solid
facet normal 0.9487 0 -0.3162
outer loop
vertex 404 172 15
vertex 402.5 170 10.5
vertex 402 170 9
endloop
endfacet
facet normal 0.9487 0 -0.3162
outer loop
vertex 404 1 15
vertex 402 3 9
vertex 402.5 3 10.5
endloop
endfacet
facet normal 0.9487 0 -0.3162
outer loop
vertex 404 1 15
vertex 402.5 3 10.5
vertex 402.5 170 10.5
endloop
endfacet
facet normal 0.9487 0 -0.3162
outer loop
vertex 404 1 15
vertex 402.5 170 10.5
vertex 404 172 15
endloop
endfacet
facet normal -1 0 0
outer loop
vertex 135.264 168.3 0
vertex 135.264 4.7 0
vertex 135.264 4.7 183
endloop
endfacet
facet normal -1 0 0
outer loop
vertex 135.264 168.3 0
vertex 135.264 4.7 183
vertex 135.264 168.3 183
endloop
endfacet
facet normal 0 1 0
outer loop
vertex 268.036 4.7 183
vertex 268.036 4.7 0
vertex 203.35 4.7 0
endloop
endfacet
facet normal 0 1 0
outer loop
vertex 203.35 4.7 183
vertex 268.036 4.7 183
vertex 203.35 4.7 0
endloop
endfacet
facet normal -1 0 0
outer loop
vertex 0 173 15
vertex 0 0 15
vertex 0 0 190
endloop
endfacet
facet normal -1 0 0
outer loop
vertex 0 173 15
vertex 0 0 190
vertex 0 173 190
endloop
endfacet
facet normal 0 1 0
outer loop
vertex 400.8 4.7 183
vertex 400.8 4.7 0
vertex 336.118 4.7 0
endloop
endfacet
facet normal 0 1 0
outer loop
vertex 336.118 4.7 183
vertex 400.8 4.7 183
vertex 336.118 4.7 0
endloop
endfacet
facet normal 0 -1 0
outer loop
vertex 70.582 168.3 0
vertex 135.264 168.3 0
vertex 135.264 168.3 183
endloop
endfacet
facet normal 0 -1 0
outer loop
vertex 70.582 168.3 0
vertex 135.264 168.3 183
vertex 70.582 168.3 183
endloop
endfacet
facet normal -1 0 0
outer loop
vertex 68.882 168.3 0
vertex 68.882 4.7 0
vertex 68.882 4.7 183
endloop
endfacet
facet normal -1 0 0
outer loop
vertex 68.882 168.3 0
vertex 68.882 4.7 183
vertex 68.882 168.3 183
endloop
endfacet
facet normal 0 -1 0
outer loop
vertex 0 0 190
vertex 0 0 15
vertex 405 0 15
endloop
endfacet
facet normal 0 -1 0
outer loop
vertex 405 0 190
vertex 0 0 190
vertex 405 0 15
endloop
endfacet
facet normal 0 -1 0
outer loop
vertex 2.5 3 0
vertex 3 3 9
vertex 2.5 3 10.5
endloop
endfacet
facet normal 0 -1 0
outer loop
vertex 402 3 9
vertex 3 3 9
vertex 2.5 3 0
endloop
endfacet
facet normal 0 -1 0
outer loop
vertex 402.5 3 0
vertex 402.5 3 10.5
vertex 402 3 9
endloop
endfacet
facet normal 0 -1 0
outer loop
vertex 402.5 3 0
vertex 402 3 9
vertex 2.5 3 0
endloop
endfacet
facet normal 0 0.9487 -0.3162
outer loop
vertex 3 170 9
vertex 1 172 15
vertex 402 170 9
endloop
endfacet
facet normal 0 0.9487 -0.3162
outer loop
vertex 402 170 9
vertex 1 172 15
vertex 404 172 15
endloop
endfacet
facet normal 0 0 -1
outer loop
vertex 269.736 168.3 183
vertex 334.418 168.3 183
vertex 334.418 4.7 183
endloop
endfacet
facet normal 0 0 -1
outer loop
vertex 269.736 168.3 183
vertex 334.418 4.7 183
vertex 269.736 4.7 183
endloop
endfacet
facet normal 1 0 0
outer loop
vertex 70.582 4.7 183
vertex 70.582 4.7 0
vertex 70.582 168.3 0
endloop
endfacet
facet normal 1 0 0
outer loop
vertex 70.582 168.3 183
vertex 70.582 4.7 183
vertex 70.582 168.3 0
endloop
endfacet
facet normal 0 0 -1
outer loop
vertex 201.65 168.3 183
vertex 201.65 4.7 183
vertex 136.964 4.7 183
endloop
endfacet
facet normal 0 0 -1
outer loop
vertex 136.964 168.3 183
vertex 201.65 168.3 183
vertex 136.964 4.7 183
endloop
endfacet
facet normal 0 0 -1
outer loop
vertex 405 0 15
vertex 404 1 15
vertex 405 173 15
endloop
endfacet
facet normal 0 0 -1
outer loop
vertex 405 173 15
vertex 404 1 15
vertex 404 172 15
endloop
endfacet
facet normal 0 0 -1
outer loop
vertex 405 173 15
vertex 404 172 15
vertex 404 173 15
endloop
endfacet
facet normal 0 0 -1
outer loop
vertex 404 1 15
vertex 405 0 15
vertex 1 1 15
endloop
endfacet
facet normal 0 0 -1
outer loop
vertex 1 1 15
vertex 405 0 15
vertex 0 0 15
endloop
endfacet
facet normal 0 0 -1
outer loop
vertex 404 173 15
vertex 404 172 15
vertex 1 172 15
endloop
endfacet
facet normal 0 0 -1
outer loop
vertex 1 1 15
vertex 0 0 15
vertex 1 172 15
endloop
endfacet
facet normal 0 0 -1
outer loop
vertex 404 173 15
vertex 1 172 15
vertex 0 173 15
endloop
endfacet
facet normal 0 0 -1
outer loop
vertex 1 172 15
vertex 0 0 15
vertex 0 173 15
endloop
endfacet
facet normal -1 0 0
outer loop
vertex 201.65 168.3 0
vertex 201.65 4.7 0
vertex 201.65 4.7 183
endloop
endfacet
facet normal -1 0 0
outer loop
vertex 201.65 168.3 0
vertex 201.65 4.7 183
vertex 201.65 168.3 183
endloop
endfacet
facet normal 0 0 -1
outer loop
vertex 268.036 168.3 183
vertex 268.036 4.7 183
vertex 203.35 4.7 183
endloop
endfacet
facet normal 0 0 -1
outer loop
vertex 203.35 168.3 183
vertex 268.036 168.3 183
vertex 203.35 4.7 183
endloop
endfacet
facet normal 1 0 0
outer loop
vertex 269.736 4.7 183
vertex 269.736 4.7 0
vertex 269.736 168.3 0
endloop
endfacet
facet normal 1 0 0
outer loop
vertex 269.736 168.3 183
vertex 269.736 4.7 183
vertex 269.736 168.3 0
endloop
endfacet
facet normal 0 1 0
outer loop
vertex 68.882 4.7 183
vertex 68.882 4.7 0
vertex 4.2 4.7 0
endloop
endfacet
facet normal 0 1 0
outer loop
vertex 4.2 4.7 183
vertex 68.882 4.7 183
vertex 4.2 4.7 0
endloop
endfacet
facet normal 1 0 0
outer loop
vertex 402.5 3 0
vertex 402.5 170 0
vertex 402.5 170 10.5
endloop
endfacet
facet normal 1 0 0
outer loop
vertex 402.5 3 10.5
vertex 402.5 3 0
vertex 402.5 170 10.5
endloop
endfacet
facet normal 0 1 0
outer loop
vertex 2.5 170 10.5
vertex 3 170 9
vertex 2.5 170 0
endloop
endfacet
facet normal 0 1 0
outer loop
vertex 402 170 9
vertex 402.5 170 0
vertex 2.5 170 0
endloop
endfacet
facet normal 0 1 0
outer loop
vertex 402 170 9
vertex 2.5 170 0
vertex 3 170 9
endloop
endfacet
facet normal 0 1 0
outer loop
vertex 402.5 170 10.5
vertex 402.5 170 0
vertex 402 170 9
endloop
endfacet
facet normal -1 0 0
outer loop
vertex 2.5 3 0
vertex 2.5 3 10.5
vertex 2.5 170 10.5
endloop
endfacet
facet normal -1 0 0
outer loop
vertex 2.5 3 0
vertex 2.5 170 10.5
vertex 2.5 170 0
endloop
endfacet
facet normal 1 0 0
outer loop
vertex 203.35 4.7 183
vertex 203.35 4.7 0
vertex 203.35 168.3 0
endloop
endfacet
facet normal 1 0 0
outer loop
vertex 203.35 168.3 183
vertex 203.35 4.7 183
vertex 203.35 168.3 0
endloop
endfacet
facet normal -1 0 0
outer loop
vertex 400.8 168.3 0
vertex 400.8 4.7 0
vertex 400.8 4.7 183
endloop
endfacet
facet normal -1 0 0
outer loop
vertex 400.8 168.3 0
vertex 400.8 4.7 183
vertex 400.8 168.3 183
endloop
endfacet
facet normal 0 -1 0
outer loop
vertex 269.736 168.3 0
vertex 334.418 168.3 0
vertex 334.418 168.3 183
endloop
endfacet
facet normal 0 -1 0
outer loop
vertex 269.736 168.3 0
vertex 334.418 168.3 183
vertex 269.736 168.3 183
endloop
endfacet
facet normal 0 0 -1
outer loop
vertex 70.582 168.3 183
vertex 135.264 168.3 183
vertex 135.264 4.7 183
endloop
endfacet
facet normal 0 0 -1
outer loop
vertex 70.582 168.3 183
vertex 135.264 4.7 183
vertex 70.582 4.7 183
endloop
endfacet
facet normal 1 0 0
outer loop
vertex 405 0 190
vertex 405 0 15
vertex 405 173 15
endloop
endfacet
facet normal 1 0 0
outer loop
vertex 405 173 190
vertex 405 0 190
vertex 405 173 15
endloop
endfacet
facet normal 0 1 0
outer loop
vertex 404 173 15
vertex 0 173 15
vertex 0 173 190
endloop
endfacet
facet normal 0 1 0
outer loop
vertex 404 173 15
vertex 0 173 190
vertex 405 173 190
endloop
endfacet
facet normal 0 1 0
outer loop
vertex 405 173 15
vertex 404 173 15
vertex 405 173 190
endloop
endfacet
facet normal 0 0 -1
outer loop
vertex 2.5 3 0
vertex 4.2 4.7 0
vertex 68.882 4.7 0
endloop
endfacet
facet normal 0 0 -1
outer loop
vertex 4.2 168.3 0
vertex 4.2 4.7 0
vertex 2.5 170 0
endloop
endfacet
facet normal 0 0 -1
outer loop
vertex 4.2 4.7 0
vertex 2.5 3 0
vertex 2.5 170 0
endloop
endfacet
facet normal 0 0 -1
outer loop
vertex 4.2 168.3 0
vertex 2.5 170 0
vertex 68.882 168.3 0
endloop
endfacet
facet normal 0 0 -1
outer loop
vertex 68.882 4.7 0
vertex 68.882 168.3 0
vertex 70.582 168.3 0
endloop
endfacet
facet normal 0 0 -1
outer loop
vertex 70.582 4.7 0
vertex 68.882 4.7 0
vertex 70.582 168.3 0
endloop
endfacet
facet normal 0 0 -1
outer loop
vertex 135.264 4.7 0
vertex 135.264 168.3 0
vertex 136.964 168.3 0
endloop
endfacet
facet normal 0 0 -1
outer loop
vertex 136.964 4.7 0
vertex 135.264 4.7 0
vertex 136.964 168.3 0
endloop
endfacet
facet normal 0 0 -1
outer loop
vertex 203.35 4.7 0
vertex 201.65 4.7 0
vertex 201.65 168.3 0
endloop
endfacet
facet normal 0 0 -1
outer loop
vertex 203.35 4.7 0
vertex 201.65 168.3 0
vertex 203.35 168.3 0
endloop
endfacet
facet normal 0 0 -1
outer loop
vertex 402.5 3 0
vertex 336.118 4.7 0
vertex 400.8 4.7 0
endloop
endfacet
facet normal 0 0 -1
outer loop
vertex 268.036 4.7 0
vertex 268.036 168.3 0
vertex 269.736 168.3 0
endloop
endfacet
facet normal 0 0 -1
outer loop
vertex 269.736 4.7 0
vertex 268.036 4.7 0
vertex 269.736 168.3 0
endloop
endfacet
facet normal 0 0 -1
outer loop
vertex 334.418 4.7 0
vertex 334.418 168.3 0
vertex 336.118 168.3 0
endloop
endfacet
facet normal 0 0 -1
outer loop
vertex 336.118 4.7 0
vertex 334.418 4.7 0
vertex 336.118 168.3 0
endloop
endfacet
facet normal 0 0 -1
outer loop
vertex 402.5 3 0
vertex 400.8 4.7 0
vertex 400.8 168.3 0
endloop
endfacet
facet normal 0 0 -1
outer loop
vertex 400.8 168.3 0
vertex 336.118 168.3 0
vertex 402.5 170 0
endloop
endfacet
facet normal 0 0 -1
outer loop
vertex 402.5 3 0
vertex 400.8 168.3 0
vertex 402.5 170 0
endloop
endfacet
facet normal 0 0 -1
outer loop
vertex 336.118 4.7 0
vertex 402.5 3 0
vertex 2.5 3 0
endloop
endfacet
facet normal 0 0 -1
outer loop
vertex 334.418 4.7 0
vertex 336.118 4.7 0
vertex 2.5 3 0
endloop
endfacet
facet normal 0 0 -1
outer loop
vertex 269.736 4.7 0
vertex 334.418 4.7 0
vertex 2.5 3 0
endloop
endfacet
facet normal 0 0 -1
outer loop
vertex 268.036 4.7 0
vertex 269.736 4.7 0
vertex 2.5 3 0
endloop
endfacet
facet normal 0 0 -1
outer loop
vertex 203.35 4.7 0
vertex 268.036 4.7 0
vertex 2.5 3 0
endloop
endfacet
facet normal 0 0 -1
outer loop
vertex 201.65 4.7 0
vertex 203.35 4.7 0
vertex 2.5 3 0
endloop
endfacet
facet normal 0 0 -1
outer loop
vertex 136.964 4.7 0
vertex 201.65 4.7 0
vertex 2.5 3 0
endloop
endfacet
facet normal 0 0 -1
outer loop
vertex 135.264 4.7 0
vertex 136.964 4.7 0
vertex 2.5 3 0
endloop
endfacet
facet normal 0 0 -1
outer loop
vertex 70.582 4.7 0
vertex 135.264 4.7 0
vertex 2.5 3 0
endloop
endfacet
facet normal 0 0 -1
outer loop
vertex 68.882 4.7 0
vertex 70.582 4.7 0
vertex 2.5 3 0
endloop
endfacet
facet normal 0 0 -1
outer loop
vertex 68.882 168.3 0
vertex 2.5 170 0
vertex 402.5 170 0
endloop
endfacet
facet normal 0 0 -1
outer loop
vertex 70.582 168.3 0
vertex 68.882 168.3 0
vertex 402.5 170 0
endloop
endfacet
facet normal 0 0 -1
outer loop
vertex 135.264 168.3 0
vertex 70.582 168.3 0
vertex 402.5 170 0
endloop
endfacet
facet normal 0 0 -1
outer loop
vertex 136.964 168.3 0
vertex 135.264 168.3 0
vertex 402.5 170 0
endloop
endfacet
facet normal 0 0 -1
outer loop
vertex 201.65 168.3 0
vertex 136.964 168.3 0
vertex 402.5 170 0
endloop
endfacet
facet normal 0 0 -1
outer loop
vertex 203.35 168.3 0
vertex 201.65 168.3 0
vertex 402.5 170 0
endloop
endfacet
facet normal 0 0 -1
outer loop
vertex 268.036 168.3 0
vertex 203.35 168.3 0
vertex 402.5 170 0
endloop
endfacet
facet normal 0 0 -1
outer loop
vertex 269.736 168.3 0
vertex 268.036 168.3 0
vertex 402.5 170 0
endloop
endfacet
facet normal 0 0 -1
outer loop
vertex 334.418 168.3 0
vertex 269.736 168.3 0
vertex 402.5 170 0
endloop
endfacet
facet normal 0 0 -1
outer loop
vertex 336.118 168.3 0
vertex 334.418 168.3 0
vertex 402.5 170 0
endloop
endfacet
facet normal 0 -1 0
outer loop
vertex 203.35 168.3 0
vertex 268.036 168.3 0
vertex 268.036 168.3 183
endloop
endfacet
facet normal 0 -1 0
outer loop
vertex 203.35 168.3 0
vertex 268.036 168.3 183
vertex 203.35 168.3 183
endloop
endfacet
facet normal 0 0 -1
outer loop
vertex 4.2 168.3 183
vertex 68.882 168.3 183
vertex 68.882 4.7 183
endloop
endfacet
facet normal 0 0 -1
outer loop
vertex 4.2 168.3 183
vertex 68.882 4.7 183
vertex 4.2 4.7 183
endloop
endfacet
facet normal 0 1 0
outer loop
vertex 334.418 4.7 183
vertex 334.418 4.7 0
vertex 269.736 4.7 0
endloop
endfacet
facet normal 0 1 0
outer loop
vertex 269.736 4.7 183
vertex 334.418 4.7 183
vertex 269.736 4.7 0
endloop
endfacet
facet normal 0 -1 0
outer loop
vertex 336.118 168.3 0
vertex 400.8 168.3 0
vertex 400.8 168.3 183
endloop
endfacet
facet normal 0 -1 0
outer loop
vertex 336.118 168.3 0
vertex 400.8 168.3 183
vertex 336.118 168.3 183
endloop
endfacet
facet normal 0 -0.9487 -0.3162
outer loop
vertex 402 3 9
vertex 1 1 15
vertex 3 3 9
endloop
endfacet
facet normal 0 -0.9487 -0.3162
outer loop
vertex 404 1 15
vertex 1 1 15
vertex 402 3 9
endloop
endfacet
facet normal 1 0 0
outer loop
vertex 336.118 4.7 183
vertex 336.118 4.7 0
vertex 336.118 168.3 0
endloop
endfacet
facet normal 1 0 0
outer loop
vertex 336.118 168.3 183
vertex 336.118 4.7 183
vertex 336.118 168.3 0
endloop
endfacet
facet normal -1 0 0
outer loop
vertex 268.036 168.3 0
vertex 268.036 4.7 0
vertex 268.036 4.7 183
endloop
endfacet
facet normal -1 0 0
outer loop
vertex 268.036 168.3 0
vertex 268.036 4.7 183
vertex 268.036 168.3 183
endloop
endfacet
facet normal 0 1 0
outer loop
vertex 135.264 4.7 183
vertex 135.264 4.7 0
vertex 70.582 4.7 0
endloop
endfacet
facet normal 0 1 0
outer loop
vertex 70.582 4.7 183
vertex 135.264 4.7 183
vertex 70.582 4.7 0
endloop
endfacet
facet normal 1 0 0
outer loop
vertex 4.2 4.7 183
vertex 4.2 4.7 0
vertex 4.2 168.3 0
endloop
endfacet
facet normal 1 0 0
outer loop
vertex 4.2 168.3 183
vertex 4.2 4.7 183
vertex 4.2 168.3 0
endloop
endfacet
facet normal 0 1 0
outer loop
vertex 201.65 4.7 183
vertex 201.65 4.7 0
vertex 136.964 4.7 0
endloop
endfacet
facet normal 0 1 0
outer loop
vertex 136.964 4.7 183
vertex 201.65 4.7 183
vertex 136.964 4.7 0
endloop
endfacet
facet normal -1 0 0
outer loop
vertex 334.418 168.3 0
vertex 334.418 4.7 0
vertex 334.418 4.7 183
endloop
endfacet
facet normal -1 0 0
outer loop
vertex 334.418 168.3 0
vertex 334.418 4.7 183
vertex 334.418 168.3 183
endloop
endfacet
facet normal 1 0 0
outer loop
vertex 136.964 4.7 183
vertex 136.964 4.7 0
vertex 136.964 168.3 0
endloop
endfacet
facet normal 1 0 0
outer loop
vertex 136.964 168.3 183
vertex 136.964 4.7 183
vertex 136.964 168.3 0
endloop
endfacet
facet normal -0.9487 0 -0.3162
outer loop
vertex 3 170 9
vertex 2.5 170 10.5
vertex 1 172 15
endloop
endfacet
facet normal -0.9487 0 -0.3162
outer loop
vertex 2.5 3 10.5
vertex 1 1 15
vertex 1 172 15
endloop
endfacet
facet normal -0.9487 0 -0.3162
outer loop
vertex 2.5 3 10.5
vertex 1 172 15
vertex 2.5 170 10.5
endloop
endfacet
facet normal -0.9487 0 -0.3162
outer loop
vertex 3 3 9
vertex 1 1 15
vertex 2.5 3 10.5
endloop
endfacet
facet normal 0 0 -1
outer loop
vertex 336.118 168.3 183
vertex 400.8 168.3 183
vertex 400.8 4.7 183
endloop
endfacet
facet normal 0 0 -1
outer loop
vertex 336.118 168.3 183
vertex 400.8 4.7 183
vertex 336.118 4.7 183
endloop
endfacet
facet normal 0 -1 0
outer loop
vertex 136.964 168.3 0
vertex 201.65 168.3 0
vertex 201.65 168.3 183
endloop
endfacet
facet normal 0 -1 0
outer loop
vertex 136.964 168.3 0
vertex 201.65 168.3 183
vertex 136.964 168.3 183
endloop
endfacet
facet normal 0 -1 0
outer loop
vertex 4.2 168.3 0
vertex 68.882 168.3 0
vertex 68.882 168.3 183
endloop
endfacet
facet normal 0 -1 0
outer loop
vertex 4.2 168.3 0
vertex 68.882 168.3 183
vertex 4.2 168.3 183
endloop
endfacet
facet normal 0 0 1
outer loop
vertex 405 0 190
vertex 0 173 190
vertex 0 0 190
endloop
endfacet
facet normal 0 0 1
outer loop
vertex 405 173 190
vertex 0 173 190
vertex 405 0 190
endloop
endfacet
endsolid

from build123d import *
from OCP.BRepFilletAPI import BRepFilletAPI_MakeChamfer

# Parameters (mm, degrees)
SKETCH_1_W          = 405
SKETCH_1_H          = 173
EXTRUDE_1_DEPTH     = 190
SKETCH_2_W          = 405
SKETCH_2_H          = 173
SKETCH_2_W_2        = 400
SKETCH_2_H_2        = 167
CUT_EXTRUDE_1_DEPTH = 9
SKETCH_3_W          = 405
SKETCH_3_H          = 6
CUT_EXTRUDE_2_DEPTH = 1
SKETCH_4_W          = 6
SKETCH_4_H          = 173
CUT_EXTRUDE_3_DEPTH = 1
SKETCH_5_W          = 404
SKETCH_5_H          = 6
CUT_EXTRUDE_4_DEPTH = 1
SKETCH_6_W          = 6
SKETCH_6_H          = 171
CUT_EXTRUDE_5_DEPTH = 1
CHAMFER_1_SIZE      = 6
CHAMFER_1_SIZE_2    = 2
CHAMFER_2_SIZE      = 2
CHAMFER_2_SIZE_2    = 6
SKETCH_7_W          = 64.686
SKETCH_7_H          = 163.6
SKETCH_7_W_2        = 64.682
CUT_EXTRUDE_6_DEPTH = 183


# Some blends are built 0.0001 mm under size
with BuildPart() as part:
    # 草图1 → 凸台-拉伸1 (new body)
    with BuildSketch(Plane.XY):
        with Locations((202.5, 86.5)):
            Rectangle(SKETCH_1_W, SKETCH_1_H)
    extrude(amount=EXTRUDE_1_DEPTH)

    # 草图2 → 切除-拉伸1 (cut)
    with BuildSketch(Plane(origin=(0, 0, 0), x_dir=(-1, 0, 0), z_dir=(0, 0, -1))):
        with Locations((-202.5, 86.5)):
            Rectangle(SKETCH_2_W, SKETCH_2_H)
        with Locations((-202.5, 86.5)):
            Rectangle(SKETCH_2_W_2, SKETCH_2_H_2, mode=Mode.SUBTRACT)
    extrude(amount=-CUT_EXTRUDE_1_DEPTH, mode=Mode.SUBTRACT)

    # 草图3 → 切除-拉伸2 (cut)
    with BuildSketch(Plane.XZ):
        with Locations((202.5, 12)):
            Rectangle(SKETCH_3_W, SKETCH_3_H)
    extrude(amount=-CUT_EXTRUDE_2_DEPTH, mode=Mode.SUBTRACT)

    # 草图4 → 切除-拉伸3 (cut)
    with BuildSketch(Plane(origin=(405, 0, 0), x_dir=(0, 0, -1), z_dir=(1, 0, 0))):
        with Locations((-12, 86.5)):
            Rectangle(SKETCH_4_W, SKETCH_4_H)
    extrude(amount=-CUT_EXTRUDE_3_DEPTH, mode=Mode.SUBTRACT)

    # 草图5 → 切除-拉伸4 (cut)
    with BuildSketch(Plane(origin=(0, 173, 0), x_dir=(1, 0, 0), z_dir=(0, 1, 0))):
        with Locations((202, -12)):
            Rectangle(SKETCH_5_W, SKETCH_5_H)
    extrude(amount=-CUT_EXTRUDE_4_DEPTH, mode=Mode.SUBTRACT)

    # 草图6 → 切除-拉伸5 (cut)
    with BuildSketch(Plane.ZY):
        with Locations((12, 86.5)):
            Rectangle(SKETCH_6_W, SKETCH_6_H)
    extrude(amount=-CUT_EXTRUDE_5_DEPTH, mode=Mode.SUBTRACT)

    # 倒角1
    # the kernel refuses this chamfer: 6, 2 mm, written as the material it takes off along each edge
    with BuildSketch(Plane(origin=(1, -14.570366064, 9), x_dir=(-0.012185754582199162, 0, 0.9999257509361694), z_dir=(0, 1, 0))) as chamfer_1_piece_1_section:
        Polygon((CHAMFER_1_SIZE * 0.999925750936, CHAMFER_1_SIZE * 0.0121857545822), (-CHAMFER_1_SIZE_2 * 0.0121857545822, CHAMFER_1_SIZE_2 * 0.999925750936), (0, 0), align=None)
    chamfer_1_piece_1 = extrude(amount=202.140732128, mode=Mode.PRIVATE)
    chamfer_1_piece_1 = split(chamfer_1_piece_1, bisect_by=Plane(origin=(2.5, 2, 11.1), z_dir=(-1, 0, 0)), keep=Keep.TOP, mode=Mode.PRIVATE)
    add(chamfer_1_piece_1, mode=Mode.SUBTRACT)
    with BuildSketch(Plane(origin=(1, -14.570366064, 9), x_dir=(-0.012185754582199162, 0, 0.9999257509361694), z_dir=(0, 1, 0))) as chamfer_1_piece_2_section:
        Polygon((CHAMFER_1_SIZE * 0.999925750936, CHAMFER_1_SIZE * 0.0121857545822), (-CHAMFER_1_SIZE_2 * 0.0121857545822, CHAMFER_1_SIZE_2 * 0.999925750936), (0, 0), align=None)
    chamfer_1_piece_2 = extrude(amount=202.140732128, mode=Mode.PRIVATE)
    chamfer_1_piece_2 = split(chamfer_1_piece_2, bisect_by=Plane(origin=(2.666666667, 3, 9.5), z_dir=(0, -1, 0)), keep=Keep.TOP, mode=Mode.PRIVATE)
    add(chamfer_1_piece_2, mode=Mode.SUBTRACT)
    with BuildSketch(Plane(origin=(1, -14.570366064, 9), x_dir=(-0.012185754582199162, 0, 0.9999257509361694), z_dir=(0, 1, 0))) as chamfer_1_piece_3_section:
        Polygon((CHAMFER_1_SIZE * 0.999925750936, CHAMFER_1_SIZE * 0.0121857545822), (-CHAMFER_1_SIZE_2 * 0.0121857545822, CHAMFER_1_SIZE_2 * 0.999925750936), (0, 0), align=None)
    chamfer_1_piece_3 = extrude(amount=202.140732128, mode=Mode.PRIVATE)
    chamfer_1_piece_3 = split(chamfer_1_piece_3, bisect_by=Plane(origin=(2.666666667, 170, 9.5), z_dir=(0, 1, 0)), keep=Keep.TOP, mode=Mode.PRIVATE)
    add(chamfer_1_piece_3, mode=Mode.SUBTRACT)
    with BuildSketch(Plane(origin=(404, -14.570366064, 9), x_dir=(-0.9940388851139268, 0, -0.10902612017980623), z_dir=(0, 1, 0))) as chamfer_1_piece_4_section:
        Polygon((CHAMFER_1_SIZE_2 * 0.994038885114, CHAMFER_1_SIZE_2 * 0.10902612018), (-CHAMFER_1_SIZE * 0.10902612018, CHAMFER_1_SIZE * 0.994038885114), (0, 0), align=None)
    chamfer_1_piece_4 = extrude(amount=202.140732128, mode=Mode.PRIVATE)
    chamfer_1_piece_4 = split(chamfer_1_piece_4, bisect_by=Plane(origin=(402.333333333, 3, 9.5), z_dir=(0, -1, 0)), keep=Keep.TOP, mode=Mode.PRIVATE)
    add(chamfer_1_piece_4, mode=Mode.SUBTRACT)
    with BuildSketch(Plane(origin=(404, -14.570366064, 9), x_dir=(-0.9940388851139268, 0, -0.10902612017980623), z_dir=(0, 1, 0))) as chamfer_1_piece_5_section:
        Polygon((CHAMFER_1_SIZE_2 * 0.994038885114, CHAMFER_1_SIZE_2 * 0.10902612018), (-CHAMFER_1_SIZE * 0.10902612018, CHAMFER_1_SIZE * 0.994038885114), (0, 0), align=None)
    chamfer_1_piece_5 = extrude(amount=202.140732128, mode=Mode.PRIVATE)
    chamfer_1_piece_5 = split(chamfer_1_piece_5, bisect_by=Plane(origin=(402.5, 86.5, 11.1), z_dir=(1, 0, 0)), keep=Keep.TOP, mode=Mode.PRIVATE)
    add(chamfer_1_piece_5, mode=Mode.SUBTRACT)
    with BuildSketch(Plane(origin=(404, -14.570366064, 9), x_dir=(-0.9940388851139268, 0, -0.10902612017980623), z_dir=(0, 1, 0))) as chamfer_1_piece_6_section:
        Polygon((CHAMFER_1_SIZE_2 * 0.994038885114, CHAMFER_1_SIZE_2 * 0.10902612018), (-CHAMFER_1_SIZE * 0.10902612018, CHAMFER_1_SIZE * 0.994038885114), (0, 0), align=None)
    chamfer_1_piece_6 = extrude(amount=202.140732128, mode=Mode.PRIVATE)
    chamfer_1_piece_6 = split(chamfer_1_piece_6, bisect_by=Plane(origin=(402.333333333, 170, 9.5), z_dir=(0, 1, 0)), keep=Keep.TOP, mode=Mode.PRIVATE)
    add(chamfer_1_piece_6, mode=Mode.SUBTRACT)

    # 倒角2
    chamfer_2_edges_1 = [part.edges().sort_by_distance(p)[0] for p in [
        (202.5, 172, 9),
    ]]
    chamfer_2_side_1 = [part.faces().sort_by_distance(p)[0] for p in [
        (202.5, 171.96, 9),
    ]]
    chamfer_2_edges_2 = [part.edges().sort_by_distance(p)[0] for p in [
        (202.5, 1, 9),
    ]]
    chamfer_2_side_2 = [part.faces().sort_by_distance(p)[0] for p in [
        (202.5, 1.04, 9),
    ]]
    chamfer_2 = BRepFilletAPI_MakeChamfer(part.part.solid().wrapped)
    for e in chamfer_2_edges_1:
        chamfer_2.Add(CHAMFER_2_SIZE - 0.0001, CHAMFER_2_SIZE_2 - 0.0001, e.wrapped, chamfer_2_side_1[0].wrapped)
    for e in chamfer_2_edges_2:
        chamfer_2.Add(CHAMFER_2_SIZE - 0.0001, CHAMFER_2_SIZE_2 - 0.0001, e.wrapped, chamfer_2_side_2[0].wrapped)
    add(Compound.cast(chamfer_2.Shape()), mode=Mode.REPLACE)  # a hair under: the kernel refuses the full size

    # 草图7 → 切除-拉伸6 (cut)
    with BuildSketch(Plane(origin=(0, 0, 0), x_dir=(-1, 0, 0), z_dir=(0, 0, -1))):
        with Locations((-235.693, 86.5)):
            Rectangle(SKETCH_7_W, SKETCH_7_H)
        with Locations((-169.307, 86.5)):
            Rectangle(SKETCH_7_W, SKETCH_7_H)
        with Locations((-102.923, 86.5)):
            Rectangle(SKETCH_7_W_2, SKETCH_7_H)
        with Locations((-36.541, 86.5)):
            Rectangle(SKETCH_7_W_2, SKETCH_7_H)
        with Locations((-302.077, 86.5)):
            Rectangle(SKETCH_7_W_2, SKETCH_7_H)
        with Locations((-368.459, 86.5)):
            Rectangle(SKETCH_7_W_2, SKETCH_7_H)
    extrude(amount=-CUT_EXTRUDE_6_DEPTH, mode=Mode.SUBTRACT)


solid = part.part
